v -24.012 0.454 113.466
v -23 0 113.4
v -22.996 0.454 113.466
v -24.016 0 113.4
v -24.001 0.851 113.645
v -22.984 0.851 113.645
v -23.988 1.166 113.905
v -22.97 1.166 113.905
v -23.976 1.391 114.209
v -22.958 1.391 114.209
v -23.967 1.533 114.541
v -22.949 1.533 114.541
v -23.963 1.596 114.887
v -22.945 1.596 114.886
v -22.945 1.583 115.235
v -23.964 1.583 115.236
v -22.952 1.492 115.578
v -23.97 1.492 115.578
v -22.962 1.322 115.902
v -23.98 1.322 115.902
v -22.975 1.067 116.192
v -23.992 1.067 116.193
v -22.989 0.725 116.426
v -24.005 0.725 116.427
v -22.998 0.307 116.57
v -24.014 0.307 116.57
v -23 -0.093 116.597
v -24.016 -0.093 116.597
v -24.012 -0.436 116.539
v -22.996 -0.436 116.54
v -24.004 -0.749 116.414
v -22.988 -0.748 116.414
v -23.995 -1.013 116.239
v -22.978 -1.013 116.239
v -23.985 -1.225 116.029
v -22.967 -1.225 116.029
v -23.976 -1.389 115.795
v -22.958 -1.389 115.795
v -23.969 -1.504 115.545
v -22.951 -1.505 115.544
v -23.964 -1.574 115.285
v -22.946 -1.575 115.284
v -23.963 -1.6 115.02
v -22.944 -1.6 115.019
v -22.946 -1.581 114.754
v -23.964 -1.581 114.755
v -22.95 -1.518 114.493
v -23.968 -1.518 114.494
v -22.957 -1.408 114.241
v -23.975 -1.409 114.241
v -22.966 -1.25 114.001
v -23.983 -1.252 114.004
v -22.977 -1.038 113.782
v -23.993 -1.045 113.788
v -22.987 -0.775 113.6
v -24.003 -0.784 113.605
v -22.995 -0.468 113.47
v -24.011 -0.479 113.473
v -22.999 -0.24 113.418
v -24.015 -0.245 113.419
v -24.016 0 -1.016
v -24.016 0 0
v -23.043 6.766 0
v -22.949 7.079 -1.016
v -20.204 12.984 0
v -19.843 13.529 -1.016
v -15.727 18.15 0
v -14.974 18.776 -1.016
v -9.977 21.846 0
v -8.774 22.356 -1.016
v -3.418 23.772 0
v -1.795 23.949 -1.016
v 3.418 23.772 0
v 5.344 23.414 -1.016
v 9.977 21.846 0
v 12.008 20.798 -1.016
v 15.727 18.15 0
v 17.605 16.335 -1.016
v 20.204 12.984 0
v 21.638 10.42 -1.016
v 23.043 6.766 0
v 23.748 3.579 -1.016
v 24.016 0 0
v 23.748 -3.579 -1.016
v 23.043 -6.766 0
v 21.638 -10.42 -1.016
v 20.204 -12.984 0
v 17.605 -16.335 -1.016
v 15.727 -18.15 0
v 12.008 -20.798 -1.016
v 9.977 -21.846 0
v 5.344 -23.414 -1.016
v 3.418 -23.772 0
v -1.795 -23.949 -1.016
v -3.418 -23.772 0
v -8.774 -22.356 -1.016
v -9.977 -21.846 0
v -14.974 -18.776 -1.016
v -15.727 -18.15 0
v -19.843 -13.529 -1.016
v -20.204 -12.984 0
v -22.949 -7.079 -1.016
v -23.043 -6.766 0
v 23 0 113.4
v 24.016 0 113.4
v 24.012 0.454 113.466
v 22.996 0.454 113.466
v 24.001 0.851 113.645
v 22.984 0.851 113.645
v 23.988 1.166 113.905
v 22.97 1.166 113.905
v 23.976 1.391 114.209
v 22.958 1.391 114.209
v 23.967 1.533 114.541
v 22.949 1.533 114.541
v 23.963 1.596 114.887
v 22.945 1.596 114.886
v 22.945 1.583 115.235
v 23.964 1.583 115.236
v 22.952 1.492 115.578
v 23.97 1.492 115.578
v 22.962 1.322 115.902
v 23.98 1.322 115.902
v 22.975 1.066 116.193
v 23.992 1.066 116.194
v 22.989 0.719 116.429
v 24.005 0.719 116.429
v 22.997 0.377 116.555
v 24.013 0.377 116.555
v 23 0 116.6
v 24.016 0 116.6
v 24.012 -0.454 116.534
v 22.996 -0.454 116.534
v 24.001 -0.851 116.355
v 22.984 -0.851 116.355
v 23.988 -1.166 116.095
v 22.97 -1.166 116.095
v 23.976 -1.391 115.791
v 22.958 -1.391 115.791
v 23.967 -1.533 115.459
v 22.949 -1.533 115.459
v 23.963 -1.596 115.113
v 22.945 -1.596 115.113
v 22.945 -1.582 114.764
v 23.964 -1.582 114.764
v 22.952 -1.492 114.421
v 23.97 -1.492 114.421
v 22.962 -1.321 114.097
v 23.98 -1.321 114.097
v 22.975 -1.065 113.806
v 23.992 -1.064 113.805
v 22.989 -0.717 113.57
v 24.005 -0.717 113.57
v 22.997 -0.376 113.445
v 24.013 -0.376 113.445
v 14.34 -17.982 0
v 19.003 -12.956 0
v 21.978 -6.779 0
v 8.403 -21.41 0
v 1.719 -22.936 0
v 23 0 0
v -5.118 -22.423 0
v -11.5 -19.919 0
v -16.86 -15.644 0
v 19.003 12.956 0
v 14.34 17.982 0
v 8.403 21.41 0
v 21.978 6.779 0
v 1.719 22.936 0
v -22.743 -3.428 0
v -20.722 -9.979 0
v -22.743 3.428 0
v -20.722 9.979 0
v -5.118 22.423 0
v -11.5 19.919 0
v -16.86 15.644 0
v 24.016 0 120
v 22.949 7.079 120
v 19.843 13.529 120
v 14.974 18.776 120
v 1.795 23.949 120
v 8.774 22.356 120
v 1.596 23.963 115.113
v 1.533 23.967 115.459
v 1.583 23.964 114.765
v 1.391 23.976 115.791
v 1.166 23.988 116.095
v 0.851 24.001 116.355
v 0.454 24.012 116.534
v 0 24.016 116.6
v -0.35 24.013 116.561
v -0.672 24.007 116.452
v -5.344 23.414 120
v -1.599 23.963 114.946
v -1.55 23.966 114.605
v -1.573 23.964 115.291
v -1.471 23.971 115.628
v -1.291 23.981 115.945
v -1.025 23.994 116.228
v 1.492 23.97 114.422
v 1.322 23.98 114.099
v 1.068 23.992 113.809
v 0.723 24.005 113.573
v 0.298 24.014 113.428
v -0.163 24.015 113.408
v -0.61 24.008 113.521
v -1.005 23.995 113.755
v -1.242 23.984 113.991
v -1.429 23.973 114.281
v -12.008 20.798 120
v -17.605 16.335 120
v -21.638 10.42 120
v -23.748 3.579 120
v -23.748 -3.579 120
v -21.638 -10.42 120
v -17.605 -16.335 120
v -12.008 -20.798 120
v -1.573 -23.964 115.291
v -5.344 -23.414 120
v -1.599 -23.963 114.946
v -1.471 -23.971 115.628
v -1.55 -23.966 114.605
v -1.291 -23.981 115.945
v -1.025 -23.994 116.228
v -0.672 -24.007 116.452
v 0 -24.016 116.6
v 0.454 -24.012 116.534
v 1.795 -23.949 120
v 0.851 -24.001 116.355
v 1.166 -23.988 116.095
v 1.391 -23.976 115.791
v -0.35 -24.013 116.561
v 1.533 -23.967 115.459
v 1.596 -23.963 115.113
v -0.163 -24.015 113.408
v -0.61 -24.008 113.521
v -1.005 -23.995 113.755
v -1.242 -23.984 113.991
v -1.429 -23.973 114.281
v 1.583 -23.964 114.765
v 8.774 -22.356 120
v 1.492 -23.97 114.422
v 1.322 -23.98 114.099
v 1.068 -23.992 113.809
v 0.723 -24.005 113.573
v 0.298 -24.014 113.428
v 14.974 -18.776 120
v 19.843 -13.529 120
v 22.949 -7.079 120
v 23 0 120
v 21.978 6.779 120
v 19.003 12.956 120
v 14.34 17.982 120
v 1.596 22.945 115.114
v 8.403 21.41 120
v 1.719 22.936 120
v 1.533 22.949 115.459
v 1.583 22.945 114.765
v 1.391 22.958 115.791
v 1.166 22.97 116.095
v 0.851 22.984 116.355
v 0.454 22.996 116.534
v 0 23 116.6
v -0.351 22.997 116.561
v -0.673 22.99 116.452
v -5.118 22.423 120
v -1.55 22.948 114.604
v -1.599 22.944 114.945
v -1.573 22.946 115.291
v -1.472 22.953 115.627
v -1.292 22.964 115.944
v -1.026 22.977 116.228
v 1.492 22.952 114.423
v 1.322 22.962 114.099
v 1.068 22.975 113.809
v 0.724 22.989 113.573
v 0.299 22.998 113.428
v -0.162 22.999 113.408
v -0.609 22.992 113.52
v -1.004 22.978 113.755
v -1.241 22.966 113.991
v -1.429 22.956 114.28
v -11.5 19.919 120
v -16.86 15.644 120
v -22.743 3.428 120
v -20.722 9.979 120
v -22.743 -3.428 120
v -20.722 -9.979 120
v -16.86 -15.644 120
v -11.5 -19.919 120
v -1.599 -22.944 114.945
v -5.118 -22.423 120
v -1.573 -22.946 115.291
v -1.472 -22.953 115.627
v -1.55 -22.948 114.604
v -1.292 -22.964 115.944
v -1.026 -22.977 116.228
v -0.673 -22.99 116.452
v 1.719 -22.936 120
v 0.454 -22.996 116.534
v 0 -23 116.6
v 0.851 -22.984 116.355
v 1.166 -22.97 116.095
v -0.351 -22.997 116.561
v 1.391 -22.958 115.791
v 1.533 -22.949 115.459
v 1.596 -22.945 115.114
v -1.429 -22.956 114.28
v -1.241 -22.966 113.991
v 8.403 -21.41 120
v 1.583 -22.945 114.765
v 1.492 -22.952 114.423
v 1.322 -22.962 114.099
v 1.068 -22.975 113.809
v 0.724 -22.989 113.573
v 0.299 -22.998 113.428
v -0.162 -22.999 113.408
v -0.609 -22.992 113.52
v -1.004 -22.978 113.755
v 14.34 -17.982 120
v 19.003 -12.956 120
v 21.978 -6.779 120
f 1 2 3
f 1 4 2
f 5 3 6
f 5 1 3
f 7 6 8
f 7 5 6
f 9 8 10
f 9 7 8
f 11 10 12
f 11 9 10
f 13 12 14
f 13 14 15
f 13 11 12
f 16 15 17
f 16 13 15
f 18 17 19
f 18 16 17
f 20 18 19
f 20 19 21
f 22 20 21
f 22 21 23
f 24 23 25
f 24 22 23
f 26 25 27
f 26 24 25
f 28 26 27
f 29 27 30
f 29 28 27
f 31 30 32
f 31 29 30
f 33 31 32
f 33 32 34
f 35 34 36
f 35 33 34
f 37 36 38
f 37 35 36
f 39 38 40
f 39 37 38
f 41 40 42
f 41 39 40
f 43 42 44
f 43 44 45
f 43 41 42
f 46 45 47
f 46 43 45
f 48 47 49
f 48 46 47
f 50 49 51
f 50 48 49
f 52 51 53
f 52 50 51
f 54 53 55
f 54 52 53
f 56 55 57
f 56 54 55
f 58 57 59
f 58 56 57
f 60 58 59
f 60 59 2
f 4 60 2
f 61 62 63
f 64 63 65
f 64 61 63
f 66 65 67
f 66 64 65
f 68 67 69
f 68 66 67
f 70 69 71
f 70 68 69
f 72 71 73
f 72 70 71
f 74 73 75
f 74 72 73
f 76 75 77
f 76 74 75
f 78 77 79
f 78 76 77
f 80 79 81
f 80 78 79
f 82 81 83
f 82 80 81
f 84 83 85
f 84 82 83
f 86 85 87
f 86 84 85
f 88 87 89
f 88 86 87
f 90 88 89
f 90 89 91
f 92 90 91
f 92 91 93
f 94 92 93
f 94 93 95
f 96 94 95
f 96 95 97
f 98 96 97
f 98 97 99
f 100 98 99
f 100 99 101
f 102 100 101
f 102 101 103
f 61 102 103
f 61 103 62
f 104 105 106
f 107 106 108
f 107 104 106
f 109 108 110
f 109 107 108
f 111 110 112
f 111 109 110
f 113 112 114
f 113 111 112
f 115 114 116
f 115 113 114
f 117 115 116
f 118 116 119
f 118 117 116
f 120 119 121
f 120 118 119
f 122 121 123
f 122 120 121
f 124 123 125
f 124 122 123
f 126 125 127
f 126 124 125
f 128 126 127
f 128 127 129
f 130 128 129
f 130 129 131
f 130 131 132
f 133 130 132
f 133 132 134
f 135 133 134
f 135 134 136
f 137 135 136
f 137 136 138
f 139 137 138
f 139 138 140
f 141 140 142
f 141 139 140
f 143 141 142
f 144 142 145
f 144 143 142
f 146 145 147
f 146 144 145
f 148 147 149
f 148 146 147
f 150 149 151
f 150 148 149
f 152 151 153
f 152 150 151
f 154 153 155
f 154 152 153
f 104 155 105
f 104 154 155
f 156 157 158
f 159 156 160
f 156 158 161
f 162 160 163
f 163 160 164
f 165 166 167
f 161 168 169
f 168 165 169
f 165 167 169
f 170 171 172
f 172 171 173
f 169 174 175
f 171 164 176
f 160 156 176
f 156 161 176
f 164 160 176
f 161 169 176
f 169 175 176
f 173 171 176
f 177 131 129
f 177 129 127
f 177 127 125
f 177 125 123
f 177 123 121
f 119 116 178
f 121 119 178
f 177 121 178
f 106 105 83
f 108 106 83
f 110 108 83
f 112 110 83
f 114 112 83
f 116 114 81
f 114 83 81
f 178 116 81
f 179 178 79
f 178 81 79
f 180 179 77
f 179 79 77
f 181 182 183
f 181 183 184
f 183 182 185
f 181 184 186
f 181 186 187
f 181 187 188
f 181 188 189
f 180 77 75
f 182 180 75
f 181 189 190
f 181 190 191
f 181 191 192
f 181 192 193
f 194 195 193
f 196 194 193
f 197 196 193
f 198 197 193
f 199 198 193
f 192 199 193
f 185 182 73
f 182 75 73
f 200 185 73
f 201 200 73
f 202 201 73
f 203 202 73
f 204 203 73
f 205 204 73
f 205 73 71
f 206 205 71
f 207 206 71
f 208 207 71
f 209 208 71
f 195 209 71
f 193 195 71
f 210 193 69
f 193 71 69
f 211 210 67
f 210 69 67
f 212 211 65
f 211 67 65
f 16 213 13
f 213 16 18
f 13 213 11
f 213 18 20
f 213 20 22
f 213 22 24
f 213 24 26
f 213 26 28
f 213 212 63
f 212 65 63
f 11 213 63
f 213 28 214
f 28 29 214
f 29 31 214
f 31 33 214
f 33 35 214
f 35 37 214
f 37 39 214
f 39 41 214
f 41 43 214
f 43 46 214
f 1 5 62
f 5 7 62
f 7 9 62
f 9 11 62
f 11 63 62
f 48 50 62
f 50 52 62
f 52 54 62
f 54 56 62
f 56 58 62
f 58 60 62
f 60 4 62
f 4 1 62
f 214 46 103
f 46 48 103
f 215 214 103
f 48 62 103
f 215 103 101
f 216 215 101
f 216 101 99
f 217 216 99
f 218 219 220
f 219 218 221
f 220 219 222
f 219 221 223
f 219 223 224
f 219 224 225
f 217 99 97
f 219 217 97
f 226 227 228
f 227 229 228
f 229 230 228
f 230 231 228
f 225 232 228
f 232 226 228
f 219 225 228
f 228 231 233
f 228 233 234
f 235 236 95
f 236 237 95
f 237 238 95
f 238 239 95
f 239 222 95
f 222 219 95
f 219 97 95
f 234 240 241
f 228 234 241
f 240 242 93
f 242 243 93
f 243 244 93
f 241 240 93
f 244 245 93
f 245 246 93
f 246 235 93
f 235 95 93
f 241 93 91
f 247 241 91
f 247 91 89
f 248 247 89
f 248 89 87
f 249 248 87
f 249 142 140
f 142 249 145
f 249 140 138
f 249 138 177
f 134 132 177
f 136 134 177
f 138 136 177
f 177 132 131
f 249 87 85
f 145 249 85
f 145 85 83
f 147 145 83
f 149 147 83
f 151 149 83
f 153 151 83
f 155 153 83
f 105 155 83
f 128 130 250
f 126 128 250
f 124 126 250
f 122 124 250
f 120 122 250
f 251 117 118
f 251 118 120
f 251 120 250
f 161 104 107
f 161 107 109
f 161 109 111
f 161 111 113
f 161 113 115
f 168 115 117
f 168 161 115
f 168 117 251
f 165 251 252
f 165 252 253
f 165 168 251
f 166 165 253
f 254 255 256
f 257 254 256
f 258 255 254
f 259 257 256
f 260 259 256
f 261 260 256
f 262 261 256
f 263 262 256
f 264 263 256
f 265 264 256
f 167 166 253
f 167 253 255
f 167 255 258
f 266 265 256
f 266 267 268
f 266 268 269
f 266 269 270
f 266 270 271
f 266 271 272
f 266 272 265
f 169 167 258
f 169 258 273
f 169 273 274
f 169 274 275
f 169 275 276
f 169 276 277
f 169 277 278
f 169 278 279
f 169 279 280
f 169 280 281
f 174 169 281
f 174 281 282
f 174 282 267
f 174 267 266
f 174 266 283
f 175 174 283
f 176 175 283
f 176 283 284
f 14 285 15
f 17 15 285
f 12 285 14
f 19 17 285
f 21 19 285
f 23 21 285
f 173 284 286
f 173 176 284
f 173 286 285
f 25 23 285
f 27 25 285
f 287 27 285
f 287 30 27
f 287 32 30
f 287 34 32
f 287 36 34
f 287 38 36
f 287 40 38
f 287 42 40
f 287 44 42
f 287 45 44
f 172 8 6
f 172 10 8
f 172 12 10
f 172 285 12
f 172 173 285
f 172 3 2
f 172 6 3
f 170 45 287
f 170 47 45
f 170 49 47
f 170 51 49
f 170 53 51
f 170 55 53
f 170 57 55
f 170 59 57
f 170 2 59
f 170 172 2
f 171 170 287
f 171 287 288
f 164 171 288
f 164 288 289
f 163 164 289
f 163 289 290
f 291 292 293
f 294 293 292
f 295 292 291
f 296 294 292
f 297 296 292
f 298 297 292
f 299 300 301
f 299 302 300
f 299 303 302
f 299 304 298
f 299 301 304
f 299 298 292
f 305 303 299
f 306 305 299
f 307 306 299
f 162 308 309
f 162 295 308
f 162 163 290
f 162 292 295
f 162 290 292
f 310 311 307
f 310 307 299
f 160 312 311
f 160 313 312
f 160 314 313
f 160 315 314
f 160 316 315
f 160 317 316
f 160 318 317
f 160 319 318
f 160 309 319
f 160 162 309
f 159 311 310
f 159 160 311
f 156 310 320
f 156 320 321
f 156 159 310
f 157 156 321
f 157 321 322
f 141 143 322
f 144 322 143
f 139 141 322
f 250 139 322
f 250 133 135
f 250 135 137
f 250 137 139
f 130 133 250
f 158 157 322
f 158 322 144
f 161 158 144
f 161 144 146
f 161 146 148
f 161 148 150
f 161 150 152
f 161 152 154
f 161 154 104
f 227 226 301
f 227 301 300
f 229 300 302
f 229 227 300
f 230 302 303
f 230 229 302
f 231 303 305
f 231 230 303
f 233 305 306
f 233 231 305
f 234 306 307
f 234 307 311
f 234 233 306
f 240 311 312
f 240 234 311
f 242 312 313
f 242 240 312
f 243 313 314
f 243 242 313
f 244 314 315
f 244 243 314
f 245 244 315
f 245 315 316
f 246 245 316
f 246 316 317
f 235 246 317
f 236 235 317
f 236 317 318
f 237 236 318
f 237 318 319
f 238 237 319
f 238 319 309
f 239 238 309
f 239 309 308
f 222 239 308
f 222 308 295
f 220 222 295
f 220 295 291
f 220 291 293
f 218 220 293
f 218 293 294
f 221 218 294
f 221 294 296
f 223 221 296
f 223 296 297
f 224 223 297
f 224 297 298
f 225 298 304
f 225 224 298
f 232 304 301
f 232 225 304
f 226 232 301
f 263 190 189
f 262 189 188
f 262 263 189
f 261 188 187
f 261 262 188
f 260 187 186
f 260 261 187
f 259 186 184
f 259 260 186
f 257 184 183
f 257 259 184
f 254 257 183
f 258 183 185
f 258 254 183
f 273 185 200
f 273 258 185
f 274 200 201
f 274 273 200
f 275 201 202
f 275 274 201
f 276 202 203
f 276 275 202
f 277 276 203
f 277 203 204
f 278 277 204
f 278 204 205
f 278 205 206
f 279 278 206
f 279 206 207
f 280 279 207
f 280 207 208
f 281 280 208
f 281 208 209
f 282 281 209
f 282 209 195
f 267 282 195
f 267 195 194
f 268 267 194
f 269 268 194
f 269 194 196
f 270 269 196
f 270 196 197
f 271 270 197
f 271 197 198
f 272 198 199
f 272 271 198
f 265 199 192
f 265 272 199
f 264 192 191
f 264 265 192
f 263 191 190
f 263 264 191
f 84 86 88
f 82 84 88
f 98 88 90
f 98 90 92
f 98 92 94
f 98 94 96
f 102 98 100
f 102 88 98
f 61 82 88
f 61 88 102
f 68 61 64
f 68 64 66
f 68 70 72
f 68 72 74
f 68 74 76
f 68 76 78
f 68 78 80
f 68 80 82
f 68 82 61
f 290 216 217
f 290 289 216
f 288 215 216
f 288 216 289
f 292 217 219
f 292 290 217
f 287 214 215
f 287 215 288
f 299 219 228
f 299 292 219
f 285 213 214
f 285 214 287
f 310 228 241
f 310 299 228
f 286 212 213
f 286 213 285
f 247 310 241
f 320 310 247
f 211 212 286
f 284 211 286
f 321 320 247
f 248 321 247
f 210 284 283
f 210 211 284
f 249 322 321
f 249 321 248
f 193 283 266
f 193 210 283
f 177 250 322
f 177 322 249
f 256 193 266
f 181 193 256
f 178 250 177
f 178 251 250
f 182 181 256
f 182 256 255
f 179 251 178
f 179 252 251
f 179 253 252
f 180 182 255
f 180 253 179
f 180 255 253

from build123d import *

# Parameters (mm, degrees)
SKETCH1_R               = 24.016
SKETCH1_R_2             = 23
EXTRUDE_THIN1_DEPTH     = 120
BOSS_EXTRUDE1_START     = 1.016
SKETCH2_R               = 24.016
BOSS_EXTRUDE1_DEPTH     = 1.016
CUT_EXTRUDE1_DEPTH      = 125.713818448
CUT_EXTRUDE1_DEPTH_BACK = 125.713818448
SKETCH3_R               = 1.6
CUT_EXTRUDE2_DEPTH      = 125.713818587
CUT_EXTRUDE2_DEPTH_BACK = 125.713818587
SKETCH4_R               = 1.6


with BuildPart() as part:
    # Sketch1 → Extrude-Thin1 (new body)
    with BuildSketch(Plane.XY):
        Circle(SKETCH1_R)
        Circle(SKETCH1_R_2, mode=Mode.SUBTRACT)
    extrude(amount=EXTRUDE_THIN1_DEPTH)

    # Sketch2 → Boss-Extrude1 (add)
    with BuildSketch(Plane(origin=(0, 0, 0), x_dir=(-1, 0, 0), z_dir=(0, 0, -1)).offset(BOSS_EXTRUDE1_START)):
        Circle(SKETCH2_R)
    extrude(amount=-BOSS_EXTRUDE1_DEPTH)

    # Sketch3 → Cut-Extrude1 (cut, two sides: drawn at the far end of the back side and taken through both)
    with BuildSketch(Plane(origin=(0, 0, 0), x_dir=(1, 0, 0), z_dir=(0, 1, 0)).offset(-CUT_EXTRUDE1_DEPTH_BACK)):
        with Locations(Location((0, -115, 0), (0, 0, 270))):
            Circle(SKETCH3_R)
    extrude(amount=CUT_EXTRUDE1_DEPTH + CUT_EXTRUDE1_DEPTH_BACK, mode=Mode.SUBTRACT)

    # Sketch4 → Cut-Extrude2 (cut, two sides: drawn at the far end of the back side and taken through both)
    with BuildSketch(Plane(origin=(0, 0, 0), x_dir=(0, 0, -1), z_dir=(1, 0, 0)).offset(-CUT_EXTRUDE2_DEPTH_BACK)):
        with Locations((-115, 0)):
            Circle(SKETCH4_R)
    extrude(amount=CUT_EXTRUDE2_DEPTH + CUT_EXTRUDE2_DEPTH_BACK, mode=Mode.SUBTRACT)


solid = part.part
